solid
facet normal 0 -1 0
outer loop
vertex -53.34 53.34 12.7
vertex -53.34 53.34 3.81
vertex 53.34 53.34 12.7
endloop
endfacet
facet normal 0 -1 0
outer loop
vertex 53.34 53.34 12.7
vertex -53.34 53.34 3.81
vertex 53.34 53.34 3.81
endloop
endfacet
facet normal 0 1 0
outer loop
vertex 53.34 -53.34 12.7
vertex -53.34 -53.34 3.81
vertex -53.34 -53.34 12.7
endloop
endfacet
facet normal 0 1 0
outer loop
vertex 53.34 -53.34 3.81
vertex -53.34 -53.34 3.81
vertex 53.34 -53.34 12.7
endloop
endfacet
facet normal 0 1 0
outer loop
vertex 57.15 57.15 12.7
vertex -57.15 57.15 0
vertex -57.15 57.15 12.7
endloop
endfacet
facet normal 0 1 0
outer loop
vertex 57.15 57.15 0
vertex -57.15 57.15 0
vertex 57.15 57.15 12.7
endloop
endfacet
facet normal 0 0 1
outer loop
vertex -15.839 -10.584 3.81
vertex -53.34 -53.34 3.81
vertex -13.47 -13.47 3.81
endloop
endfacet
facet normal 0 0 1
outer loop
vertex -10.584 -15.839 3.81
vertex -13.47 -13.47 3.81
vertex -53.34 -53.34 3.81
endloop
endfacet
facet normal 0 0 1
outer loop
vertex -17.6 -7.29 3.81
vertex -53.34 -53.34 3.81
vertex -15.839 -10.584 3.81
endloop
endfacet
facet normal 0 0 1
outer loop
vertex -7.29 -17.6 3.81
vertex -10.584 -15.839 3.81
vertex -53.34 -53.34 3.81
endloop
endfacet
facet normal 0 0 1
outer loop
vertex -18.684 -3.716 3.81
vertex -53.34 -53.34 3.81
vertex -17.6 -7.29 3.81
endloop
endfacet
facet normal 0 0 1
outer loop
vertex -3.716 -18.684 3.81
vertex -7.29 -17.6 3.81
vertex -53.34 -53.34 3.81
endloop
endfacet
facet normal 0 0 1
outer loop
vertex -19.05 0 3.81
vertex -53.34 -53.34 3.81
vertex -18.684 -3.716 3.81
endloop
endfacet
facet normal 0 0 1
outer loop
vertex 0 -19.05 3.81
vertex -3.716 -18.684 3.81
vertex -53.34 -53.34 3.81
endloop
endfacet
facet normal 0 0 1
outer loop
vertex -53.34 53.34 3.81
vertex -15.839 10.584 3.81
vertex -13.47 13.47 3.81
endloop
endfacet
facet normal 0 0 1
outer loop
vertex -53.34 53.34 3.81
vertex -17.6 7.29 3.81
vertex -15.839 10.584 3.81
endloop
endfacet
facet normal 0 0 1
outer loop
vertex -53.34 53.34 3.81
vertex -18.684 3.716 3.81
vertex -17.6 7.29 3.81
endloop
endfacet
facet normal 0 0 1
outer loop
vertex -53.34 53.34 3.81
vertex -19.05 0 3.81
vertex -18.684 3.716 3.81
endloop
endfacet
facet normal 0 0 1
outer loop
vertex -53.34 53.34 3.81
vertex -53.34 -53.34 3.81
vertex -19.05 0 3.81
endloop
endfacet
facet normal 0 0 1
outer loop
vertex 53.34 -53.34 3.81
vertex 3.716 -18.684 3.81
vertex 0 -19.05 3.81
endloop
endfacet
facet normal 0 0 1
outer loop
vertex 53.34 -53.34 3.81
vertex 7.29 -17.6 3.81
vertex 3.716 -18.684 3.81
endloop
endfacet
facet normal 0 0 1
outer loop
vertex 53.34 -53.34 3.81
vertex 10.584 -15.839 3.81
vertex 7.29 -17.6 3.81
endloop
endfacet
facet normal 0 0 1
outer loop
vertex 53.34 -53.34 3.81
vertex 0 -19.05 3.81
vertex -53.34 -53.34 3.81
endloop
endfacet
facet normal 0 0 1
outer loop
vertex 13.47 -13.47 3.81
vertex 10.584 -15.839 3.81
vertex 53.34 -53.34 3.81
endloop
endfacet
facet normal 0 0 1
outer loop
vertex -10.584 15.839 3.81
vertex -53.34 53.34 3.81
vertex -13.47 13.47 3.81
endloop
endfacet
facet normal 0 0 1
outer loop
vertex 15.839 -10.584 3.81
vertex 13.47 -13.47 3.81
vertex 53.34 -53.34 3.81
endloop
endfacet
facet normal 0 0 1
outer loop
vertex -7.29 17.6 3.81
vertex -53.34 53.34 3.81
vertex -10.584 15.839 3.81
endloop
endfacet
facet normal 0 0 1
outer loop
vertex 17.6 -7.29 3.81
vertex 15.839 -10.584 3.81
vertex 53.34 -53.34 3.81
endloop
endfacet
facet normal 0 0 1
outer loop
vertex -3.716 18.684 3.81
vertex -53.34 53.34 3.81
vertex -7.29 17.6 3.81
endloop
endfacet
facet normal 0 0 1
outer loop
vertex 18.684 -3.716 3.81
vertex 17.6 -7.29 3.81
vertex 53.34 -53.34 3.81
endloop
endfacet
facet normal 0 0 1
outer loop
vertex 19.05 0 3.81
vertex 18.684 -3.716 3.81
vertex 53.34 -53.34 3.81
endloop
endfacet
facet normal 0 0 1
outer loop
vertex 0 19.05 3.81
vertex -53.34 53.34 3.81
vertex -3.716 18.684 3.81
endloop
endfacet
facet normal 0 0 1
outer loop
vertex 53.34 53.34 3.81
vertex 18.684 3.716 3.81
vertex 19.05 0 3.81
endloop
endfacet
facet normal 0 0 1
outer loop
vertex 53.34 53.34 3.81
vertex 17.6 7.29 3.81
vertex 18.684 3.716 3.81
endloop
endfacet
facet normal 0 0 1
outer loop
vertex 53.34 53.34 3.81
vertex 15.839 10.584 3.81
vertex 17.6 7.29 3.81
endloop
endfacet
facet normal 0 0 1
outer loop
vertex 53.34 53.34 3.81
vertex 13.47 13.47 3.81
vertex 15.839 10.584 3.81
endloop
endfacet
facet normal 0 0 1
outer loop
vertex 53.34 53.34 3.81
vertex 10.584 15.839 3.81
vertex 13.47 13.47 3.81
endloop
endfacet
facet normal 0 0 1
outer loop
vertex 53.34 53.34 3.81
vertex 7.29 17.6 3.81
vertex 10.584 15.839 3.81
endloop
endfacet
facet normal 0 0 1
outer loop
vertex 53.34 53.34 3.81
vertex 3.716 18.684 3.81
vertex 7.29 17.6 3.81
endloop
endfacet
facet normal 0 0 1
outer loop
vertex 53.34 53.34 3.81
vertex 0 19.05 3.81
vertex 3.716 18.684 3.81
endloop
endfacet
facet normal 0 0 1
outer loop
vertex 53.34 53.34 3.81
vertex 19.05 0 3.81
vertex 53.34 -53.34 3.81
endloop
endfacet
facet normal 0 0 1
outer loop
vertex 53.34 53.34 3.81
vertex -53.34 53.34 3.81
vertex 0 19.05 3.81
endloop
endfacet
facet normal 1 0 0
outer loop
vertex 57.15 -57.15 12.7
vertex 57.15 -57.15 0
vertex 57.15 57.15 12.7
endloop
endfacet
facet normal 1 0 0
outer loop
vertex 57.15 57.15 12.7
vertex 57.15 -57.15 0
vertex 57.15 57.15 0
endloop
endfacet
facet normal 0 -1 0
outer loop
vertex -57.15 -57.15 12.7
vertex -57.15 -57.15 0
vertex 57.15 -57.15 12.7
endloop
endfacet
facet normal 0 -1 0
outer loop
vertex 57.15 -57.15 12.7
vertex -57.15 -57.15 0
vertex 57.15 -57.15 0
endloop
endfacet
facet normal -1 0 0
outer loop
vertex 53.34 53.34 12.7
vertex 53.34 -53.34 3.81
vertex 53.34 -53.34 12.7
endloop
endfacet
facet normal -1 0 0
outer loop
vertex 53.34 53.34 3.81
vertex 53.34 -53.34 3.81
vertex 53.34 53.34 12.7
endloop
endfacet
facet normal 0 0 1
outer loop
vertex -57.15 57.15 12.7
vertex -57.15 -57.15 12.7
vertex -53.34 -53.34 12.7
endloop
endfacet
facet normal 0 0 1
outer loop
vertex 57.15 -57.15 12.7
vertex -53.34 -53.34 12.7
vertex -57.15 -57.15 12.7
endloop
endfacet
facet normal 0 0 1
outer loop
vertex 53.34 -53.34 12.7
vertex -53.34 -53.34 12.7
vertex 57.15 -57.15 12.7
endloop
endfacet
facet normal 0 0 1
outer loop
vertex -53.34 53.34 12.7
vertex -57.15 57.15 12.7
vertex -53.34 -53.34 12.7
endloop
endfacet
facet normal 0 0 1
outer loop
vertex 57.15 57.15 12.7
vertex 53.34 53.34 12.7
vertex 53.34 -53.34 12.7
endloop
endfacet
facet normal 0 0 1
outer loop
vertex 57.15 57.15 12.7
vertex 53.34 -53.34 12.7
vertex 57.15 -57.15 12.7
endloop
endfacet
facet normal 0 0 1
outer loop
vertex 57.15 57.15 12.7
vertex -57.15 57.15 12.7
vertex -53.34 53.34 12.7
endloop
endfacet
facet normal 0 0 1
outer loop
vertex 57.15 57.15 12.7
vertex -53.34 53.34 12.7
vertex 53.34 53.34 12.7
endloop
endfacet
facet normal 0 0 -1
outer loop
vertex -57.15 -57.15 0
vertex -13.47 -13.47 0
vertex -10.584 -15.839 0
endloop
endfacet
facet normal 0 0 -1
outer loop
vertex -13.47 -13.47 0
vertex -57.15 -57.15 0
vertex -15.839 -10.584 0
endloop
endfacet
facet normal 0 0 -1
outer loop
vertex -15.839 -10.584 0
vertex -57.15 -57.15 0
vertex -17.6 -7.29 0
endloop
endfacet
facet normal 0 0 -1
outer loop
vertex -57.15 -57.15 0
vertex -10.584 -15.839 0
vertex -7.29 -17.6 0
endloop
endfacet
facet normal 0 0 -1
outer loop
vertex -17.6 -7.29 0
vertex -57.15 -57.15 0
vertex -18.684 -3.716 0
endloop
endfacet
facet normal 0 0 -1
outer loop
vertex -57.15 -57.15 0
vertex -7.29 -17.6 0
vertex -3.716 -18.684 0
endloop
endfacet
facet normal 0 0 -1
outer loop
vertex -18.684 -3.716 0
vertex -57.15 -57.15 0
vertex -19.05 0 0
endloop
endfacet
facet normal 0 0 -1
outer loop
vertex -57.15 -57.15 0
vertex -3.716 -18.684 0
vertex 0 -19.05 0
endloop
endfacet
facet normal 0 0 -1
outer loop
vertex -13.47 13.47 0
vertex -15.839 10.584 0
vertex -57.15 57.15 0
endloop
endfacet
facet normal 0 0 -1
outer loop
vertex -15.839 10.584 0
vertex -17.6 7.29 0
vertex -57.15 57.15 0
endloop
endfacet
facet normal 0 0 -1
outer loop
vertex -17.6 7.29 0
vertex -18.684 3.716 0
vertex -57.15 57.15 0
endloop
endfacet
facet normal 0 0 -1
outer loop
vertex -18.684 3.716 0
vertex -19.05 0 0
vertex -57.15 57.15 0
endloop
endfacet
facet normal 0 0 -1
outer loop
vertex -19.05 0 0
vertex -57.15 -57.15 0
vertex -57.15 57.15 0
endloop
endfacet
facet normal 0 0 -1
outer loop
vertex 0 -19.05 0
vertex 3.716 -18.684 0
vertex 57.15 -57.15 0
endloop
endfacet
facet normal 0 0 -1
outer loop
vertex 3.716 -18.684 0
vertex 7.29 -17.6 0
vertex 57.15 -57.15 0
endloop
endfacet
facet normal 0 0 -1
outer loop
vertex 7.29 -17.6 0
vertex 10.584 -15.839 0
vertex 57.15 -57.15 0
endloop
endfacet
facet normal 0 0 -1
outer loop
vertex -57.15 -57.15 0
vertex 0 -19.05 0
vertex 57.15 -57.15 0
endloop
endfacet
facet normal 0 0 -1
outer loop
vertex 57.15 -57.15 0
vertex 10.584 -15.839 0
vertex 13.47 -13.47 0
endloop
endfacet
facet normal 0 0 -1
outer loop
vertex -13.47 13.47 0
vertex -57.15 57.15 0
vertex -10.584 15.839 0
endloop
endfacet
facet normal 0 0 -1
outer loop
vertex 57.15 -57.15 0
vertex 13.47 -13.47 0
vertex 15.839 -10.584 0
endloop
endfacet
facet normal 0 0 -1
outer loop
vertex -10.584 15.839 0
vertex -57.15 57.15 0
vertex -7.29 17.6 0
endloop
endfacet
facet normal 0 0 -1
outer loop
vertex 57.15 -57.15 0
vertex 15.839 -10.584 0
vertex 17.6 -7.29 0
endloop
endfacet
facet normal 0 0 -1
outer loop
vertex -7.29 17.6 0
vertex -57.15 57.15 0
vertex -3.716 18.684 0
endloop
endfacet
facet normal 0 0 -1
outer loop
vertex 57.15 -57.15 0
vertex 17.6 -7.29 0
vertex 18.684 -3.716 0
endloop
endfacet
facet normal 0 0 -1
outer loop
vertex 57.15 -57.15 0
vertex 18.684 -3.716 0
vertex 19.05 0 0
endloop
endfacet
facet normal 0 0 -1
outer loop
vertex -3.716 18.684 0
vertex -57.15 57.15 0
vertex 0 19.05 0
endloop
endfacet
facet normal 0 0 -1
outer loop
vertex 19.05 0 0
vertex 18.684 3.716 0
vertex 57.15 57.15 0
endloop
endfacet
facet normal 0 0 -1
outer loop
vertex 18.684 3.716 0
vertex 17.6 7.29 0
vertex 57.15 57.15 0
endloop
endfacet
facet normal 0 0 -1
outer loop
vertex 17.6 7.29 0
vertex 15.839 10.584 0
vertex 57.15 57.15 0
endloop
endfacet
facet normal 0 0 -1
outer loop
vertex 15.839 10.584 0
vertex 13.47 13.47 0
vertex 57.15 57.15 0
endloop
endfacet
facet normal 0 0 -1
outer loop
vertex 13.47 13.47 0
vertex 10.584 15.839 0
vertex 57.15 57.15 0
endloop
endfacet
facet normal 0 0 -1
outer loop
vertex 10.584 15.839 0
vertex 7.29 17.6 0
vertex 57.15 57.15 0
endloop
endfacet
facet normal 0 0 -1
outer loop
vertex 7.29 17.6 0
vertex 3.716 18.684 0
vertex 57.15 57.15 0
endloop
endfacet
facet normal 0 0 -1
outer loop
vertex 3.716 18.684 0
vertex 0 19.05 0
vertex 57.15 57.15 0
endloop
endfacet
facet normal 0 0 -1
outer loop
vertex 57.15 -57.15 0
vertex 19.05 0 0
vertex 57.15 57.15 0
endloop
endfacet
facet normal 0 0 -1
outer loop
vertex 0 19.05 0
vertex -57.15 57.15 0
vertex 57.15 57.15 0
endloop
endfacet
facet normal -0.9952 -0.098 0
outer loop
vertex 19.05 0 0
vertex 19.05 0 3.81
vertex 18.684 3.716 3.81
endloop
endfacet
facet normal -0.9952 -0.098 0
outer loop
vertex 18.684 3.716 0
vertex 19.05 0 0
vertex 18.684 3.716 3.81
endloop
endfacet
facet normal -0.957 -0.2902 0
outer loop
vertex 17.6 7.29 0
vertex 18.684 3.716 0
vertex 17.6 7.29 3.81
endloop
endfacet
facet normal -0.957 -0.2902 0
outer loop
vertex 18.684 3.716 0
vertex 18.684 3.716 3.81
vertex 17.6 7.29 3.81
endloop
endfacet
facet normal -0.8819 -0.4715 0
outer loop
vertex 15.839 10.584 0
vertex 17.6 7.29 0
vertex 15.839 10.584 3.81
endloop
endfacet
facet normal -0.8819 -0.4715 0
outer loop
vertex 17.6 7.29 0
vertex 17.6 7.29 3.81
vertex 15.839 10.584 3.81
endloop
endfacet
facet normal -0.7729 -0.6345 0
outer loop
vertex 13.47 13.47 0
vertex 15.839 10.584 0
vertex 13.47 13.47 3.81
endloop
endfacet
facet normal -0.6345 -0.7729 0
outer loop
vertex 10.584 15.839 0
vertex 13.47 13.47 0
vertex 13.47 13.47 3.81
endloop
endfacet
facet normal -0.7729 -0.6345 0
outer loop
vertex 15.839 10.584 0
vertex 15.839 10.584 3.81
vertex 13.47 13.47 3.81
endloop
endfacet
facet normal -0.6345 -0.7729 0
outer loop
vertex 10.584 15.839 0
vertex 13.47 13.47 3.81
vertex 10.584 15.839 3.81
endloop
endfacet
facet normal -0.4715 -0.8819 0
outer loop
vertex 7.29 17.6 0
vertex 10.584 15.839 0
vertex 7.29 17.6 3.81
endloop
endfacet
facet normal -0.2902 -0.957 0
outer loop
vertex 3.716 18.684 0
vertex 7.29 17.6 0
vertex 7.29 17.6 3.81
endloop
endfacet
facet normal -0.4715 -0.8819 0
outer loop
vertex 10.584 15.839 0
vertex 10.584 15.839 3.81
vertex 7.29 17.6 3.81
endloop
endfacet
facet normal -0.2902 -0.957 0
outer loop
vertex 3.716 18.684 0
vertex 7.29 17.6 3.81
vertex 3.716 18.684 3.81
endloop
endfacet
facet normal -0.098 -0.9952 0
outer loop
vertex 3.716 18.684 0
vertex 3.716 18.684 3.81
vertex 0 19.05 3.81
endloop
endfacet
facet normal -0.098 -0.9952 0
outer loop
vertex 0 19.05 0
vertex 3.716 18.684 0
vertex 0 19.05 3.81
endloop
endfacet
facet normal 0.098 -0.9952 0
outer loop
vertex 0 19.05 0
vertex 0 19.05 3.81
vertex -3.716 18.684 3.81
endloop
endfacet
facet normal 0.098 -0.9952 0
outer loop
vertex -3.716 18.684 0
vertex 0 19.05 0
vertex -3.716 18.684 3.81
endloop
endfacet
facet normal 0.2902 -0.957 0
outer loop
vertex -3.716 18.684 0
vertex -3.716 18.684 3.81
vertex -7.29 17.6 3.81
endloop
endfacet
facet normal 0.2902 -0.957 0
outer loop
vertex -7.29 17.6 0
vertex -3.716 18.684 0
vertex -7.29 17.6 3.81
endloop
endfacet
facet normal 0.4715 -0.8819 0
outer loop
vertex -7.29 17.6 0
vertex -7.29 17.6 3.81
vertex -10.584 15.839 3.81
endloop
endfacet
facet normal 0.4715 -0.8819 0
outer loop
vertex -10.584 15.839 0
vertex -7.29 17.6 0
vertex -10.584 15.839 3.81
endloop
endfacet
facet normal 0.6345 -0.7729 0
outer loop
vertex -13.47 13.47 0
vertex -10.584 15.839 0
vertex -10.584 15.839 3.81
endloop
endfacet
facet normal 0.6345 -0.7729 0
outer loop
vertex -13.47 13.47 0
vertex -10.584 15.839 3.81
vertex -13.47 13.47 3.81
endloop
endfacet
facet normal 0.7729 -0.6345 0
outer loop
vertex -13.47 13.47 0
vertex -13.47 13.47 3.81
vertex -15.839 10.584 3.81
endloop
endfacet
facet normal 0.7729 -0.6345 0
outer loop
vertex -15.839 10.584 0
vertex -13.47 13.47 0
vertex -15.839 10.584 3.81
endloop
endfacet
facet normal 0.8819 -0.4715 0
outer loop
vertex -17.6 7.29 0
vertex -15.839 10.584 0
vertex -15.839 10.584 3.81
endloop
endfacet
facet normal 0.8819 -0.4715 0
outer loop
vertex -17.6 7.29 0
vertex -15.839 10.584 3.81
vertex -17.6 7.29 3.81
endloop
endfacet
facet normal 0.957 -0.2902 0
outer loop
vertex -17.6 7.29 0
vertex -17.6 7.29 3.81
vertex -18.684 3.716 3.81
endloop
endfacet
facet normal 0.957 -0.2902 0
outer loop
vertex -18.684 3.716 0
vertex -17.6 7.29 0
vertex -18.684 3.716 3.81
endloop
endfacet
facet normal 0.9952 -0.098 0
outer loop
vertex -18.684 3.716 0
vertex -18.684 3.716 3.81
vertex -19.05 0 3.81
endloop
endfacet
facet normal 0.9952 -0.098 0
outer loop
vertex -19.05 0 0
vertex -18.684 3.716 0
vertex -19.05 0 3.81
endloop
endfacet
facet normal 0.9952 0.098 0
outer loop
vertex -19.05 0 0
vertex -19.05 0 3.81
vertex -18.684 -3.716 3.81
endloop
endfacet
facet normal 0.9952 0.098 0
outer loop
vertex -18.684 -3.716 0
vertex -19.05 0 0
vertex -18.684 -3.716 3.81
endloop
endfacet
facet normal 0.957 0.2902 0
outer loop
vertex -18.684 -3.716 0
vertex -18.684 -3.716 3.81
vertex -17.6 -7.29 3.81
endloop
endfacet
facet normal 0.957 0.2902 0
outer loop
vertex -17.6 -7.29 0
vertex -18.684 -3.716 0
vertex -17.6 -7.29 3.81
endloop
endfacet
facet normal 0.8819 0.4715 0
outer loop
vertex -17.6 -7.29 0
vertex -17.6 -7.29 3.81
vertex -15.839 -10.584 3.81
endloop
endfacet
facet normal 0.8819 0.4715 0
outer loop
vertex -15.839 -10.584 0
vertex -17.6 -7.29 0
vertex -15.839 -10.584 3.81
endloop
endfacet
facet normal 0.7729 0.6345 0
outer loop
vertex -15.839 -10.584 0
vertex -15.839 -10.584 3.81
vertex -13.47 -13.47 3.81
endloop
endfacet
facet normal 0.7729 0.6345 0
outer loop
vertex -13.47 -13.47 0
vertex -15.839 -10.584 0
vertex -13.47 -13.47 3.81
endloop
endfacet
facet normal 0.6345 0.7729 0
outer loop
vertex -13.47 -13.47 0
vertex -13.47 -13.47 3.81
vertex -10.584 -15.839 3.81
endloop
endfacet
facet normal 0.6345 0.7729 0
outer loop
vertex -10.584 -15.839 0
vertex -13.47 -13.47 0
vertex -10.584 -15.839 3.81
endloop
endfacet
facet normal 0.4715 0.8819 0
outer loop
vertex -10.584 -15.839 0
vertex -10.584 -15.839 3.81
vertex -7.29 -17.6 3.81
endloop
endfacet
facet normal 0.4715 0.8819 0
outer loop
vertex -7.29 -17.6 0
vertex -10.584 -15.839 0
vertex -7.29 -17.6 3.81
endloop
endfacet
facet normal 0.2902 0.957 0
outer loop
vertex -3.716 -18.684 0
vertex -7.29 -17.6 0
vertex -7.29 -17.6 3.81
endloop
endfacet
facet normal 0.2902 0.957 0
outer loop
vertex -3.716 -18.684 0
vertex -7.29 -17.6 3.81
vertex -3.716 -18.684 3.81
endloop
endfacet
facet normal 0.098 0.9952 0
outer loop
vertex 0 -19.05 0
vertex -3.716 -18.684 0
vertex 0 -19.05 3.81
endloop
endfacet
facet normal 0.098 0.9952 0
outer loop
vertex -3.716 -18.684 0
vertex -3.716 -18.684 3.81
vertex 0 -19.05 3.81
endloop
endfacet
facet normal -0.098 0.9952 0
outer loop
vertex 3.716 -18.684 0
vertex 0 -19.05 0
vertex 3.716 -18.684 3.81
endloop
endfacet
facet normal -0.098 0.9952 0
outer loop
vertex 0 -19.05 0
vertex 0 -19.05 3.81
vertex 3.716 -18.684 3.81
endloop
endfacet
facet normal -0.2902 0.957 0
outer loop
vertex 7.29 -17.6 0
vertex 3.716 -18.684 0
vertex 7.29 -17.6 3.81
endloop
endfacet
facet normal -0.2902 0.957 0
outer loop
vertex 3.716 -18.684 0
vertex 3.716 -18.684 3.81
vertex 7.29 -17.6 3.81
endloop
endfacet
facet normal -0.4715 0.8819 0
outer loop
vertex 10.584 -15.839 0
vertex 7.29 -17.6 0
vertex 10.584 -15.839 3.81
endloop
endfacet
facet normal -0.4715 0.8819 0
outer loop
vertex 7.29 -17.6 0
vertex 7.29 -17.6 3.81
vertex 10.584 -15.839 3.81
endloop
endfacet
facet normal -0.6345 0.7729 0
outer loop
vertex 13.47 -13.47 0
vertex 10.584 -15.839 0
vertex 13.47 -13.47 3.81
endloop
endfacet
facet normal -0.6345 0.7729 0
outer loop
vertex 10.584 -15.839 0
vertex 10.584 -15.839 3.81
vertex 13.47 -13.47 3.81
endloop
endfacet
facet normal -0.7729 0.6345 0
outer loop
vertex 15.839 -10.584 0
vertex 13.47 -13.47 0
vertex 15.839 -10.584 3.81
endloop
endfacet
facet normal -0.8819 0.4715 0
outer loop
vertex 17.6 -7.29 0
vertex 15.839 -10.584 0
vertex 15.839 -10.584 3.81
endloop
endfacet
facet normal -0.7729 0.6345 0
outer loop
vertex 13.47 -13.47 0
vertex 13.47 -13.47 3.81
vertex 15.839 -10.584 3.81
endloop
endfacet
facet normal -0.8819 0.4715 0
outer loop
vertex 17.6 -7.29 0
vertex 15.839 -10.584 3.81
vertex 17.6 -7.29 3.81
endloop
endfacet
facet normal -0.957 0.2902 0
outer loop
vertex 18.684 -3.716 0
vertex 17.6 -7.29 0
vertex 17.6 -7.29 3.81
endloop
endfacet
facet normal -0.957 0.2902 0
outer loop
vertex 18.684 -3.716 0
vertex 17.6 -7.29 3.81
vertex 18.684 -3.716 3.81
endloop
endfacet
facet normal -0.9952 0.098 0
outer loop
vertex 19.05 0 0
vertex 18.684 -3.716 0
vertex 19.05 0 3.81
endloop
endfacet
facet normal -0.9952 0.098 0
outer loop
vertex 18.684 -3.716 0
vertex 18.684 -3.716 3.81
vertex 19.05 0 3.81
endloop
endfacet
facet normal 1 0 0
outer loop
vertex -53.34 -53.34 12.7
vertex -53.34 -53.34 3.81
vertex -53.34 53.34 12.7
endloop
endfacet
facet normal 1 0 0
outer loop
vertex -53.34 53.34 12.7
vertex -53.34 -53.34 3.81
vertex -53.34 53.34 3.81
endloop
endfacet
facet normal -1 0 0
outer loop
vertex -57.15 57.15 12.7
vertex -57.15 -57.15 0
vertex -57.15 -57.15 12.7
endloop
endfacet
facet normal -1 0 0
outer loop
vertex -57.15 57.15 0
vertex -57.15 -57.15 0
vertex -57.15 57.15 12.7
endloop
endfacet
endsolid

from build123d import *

# Parameters (mm, degrees)
F0_W     = 114.3
F0_H     = 114.3
F0_W_2   = 106.68
F0_H_2   = 106.68
F1_DEPTH = 3.81
F2_DEPTH = 12.7
F4_R     = 19.05
F5_DEPTH = 6.858


with BuildPart() as f1:
    # F0 (on Top) → F1 (new body)
    with BuildSketch(Plane.XY):
        Rectangle(F0_W, F0_H)
        Rectangle(F0_W_2, F0_H_2, mode=Mode.SUBTRACT)
        Rectangle(F0_W_2, F0_H_2)
    extrude(amount=F1_DEPTH)

    # F0 (on Top) → F2 (join)
    with BuildSketch(Plane.XY):
        Rectangle(F0_W, F0_H)
        Rectangle(F0_W_2, F0_H_2, mode=Mode.SUBTRACT)
    extrude(amount=F2_DEPTH)

    # F4 (on face) → F5 (cut)
    with BuildSketch(Plane.XY.offset(3.81)):
        Circle(F4_R)
    extrude(amount=-F5_DEPTH, mode=Mode.SUBTRACT)


solid = f1.part
